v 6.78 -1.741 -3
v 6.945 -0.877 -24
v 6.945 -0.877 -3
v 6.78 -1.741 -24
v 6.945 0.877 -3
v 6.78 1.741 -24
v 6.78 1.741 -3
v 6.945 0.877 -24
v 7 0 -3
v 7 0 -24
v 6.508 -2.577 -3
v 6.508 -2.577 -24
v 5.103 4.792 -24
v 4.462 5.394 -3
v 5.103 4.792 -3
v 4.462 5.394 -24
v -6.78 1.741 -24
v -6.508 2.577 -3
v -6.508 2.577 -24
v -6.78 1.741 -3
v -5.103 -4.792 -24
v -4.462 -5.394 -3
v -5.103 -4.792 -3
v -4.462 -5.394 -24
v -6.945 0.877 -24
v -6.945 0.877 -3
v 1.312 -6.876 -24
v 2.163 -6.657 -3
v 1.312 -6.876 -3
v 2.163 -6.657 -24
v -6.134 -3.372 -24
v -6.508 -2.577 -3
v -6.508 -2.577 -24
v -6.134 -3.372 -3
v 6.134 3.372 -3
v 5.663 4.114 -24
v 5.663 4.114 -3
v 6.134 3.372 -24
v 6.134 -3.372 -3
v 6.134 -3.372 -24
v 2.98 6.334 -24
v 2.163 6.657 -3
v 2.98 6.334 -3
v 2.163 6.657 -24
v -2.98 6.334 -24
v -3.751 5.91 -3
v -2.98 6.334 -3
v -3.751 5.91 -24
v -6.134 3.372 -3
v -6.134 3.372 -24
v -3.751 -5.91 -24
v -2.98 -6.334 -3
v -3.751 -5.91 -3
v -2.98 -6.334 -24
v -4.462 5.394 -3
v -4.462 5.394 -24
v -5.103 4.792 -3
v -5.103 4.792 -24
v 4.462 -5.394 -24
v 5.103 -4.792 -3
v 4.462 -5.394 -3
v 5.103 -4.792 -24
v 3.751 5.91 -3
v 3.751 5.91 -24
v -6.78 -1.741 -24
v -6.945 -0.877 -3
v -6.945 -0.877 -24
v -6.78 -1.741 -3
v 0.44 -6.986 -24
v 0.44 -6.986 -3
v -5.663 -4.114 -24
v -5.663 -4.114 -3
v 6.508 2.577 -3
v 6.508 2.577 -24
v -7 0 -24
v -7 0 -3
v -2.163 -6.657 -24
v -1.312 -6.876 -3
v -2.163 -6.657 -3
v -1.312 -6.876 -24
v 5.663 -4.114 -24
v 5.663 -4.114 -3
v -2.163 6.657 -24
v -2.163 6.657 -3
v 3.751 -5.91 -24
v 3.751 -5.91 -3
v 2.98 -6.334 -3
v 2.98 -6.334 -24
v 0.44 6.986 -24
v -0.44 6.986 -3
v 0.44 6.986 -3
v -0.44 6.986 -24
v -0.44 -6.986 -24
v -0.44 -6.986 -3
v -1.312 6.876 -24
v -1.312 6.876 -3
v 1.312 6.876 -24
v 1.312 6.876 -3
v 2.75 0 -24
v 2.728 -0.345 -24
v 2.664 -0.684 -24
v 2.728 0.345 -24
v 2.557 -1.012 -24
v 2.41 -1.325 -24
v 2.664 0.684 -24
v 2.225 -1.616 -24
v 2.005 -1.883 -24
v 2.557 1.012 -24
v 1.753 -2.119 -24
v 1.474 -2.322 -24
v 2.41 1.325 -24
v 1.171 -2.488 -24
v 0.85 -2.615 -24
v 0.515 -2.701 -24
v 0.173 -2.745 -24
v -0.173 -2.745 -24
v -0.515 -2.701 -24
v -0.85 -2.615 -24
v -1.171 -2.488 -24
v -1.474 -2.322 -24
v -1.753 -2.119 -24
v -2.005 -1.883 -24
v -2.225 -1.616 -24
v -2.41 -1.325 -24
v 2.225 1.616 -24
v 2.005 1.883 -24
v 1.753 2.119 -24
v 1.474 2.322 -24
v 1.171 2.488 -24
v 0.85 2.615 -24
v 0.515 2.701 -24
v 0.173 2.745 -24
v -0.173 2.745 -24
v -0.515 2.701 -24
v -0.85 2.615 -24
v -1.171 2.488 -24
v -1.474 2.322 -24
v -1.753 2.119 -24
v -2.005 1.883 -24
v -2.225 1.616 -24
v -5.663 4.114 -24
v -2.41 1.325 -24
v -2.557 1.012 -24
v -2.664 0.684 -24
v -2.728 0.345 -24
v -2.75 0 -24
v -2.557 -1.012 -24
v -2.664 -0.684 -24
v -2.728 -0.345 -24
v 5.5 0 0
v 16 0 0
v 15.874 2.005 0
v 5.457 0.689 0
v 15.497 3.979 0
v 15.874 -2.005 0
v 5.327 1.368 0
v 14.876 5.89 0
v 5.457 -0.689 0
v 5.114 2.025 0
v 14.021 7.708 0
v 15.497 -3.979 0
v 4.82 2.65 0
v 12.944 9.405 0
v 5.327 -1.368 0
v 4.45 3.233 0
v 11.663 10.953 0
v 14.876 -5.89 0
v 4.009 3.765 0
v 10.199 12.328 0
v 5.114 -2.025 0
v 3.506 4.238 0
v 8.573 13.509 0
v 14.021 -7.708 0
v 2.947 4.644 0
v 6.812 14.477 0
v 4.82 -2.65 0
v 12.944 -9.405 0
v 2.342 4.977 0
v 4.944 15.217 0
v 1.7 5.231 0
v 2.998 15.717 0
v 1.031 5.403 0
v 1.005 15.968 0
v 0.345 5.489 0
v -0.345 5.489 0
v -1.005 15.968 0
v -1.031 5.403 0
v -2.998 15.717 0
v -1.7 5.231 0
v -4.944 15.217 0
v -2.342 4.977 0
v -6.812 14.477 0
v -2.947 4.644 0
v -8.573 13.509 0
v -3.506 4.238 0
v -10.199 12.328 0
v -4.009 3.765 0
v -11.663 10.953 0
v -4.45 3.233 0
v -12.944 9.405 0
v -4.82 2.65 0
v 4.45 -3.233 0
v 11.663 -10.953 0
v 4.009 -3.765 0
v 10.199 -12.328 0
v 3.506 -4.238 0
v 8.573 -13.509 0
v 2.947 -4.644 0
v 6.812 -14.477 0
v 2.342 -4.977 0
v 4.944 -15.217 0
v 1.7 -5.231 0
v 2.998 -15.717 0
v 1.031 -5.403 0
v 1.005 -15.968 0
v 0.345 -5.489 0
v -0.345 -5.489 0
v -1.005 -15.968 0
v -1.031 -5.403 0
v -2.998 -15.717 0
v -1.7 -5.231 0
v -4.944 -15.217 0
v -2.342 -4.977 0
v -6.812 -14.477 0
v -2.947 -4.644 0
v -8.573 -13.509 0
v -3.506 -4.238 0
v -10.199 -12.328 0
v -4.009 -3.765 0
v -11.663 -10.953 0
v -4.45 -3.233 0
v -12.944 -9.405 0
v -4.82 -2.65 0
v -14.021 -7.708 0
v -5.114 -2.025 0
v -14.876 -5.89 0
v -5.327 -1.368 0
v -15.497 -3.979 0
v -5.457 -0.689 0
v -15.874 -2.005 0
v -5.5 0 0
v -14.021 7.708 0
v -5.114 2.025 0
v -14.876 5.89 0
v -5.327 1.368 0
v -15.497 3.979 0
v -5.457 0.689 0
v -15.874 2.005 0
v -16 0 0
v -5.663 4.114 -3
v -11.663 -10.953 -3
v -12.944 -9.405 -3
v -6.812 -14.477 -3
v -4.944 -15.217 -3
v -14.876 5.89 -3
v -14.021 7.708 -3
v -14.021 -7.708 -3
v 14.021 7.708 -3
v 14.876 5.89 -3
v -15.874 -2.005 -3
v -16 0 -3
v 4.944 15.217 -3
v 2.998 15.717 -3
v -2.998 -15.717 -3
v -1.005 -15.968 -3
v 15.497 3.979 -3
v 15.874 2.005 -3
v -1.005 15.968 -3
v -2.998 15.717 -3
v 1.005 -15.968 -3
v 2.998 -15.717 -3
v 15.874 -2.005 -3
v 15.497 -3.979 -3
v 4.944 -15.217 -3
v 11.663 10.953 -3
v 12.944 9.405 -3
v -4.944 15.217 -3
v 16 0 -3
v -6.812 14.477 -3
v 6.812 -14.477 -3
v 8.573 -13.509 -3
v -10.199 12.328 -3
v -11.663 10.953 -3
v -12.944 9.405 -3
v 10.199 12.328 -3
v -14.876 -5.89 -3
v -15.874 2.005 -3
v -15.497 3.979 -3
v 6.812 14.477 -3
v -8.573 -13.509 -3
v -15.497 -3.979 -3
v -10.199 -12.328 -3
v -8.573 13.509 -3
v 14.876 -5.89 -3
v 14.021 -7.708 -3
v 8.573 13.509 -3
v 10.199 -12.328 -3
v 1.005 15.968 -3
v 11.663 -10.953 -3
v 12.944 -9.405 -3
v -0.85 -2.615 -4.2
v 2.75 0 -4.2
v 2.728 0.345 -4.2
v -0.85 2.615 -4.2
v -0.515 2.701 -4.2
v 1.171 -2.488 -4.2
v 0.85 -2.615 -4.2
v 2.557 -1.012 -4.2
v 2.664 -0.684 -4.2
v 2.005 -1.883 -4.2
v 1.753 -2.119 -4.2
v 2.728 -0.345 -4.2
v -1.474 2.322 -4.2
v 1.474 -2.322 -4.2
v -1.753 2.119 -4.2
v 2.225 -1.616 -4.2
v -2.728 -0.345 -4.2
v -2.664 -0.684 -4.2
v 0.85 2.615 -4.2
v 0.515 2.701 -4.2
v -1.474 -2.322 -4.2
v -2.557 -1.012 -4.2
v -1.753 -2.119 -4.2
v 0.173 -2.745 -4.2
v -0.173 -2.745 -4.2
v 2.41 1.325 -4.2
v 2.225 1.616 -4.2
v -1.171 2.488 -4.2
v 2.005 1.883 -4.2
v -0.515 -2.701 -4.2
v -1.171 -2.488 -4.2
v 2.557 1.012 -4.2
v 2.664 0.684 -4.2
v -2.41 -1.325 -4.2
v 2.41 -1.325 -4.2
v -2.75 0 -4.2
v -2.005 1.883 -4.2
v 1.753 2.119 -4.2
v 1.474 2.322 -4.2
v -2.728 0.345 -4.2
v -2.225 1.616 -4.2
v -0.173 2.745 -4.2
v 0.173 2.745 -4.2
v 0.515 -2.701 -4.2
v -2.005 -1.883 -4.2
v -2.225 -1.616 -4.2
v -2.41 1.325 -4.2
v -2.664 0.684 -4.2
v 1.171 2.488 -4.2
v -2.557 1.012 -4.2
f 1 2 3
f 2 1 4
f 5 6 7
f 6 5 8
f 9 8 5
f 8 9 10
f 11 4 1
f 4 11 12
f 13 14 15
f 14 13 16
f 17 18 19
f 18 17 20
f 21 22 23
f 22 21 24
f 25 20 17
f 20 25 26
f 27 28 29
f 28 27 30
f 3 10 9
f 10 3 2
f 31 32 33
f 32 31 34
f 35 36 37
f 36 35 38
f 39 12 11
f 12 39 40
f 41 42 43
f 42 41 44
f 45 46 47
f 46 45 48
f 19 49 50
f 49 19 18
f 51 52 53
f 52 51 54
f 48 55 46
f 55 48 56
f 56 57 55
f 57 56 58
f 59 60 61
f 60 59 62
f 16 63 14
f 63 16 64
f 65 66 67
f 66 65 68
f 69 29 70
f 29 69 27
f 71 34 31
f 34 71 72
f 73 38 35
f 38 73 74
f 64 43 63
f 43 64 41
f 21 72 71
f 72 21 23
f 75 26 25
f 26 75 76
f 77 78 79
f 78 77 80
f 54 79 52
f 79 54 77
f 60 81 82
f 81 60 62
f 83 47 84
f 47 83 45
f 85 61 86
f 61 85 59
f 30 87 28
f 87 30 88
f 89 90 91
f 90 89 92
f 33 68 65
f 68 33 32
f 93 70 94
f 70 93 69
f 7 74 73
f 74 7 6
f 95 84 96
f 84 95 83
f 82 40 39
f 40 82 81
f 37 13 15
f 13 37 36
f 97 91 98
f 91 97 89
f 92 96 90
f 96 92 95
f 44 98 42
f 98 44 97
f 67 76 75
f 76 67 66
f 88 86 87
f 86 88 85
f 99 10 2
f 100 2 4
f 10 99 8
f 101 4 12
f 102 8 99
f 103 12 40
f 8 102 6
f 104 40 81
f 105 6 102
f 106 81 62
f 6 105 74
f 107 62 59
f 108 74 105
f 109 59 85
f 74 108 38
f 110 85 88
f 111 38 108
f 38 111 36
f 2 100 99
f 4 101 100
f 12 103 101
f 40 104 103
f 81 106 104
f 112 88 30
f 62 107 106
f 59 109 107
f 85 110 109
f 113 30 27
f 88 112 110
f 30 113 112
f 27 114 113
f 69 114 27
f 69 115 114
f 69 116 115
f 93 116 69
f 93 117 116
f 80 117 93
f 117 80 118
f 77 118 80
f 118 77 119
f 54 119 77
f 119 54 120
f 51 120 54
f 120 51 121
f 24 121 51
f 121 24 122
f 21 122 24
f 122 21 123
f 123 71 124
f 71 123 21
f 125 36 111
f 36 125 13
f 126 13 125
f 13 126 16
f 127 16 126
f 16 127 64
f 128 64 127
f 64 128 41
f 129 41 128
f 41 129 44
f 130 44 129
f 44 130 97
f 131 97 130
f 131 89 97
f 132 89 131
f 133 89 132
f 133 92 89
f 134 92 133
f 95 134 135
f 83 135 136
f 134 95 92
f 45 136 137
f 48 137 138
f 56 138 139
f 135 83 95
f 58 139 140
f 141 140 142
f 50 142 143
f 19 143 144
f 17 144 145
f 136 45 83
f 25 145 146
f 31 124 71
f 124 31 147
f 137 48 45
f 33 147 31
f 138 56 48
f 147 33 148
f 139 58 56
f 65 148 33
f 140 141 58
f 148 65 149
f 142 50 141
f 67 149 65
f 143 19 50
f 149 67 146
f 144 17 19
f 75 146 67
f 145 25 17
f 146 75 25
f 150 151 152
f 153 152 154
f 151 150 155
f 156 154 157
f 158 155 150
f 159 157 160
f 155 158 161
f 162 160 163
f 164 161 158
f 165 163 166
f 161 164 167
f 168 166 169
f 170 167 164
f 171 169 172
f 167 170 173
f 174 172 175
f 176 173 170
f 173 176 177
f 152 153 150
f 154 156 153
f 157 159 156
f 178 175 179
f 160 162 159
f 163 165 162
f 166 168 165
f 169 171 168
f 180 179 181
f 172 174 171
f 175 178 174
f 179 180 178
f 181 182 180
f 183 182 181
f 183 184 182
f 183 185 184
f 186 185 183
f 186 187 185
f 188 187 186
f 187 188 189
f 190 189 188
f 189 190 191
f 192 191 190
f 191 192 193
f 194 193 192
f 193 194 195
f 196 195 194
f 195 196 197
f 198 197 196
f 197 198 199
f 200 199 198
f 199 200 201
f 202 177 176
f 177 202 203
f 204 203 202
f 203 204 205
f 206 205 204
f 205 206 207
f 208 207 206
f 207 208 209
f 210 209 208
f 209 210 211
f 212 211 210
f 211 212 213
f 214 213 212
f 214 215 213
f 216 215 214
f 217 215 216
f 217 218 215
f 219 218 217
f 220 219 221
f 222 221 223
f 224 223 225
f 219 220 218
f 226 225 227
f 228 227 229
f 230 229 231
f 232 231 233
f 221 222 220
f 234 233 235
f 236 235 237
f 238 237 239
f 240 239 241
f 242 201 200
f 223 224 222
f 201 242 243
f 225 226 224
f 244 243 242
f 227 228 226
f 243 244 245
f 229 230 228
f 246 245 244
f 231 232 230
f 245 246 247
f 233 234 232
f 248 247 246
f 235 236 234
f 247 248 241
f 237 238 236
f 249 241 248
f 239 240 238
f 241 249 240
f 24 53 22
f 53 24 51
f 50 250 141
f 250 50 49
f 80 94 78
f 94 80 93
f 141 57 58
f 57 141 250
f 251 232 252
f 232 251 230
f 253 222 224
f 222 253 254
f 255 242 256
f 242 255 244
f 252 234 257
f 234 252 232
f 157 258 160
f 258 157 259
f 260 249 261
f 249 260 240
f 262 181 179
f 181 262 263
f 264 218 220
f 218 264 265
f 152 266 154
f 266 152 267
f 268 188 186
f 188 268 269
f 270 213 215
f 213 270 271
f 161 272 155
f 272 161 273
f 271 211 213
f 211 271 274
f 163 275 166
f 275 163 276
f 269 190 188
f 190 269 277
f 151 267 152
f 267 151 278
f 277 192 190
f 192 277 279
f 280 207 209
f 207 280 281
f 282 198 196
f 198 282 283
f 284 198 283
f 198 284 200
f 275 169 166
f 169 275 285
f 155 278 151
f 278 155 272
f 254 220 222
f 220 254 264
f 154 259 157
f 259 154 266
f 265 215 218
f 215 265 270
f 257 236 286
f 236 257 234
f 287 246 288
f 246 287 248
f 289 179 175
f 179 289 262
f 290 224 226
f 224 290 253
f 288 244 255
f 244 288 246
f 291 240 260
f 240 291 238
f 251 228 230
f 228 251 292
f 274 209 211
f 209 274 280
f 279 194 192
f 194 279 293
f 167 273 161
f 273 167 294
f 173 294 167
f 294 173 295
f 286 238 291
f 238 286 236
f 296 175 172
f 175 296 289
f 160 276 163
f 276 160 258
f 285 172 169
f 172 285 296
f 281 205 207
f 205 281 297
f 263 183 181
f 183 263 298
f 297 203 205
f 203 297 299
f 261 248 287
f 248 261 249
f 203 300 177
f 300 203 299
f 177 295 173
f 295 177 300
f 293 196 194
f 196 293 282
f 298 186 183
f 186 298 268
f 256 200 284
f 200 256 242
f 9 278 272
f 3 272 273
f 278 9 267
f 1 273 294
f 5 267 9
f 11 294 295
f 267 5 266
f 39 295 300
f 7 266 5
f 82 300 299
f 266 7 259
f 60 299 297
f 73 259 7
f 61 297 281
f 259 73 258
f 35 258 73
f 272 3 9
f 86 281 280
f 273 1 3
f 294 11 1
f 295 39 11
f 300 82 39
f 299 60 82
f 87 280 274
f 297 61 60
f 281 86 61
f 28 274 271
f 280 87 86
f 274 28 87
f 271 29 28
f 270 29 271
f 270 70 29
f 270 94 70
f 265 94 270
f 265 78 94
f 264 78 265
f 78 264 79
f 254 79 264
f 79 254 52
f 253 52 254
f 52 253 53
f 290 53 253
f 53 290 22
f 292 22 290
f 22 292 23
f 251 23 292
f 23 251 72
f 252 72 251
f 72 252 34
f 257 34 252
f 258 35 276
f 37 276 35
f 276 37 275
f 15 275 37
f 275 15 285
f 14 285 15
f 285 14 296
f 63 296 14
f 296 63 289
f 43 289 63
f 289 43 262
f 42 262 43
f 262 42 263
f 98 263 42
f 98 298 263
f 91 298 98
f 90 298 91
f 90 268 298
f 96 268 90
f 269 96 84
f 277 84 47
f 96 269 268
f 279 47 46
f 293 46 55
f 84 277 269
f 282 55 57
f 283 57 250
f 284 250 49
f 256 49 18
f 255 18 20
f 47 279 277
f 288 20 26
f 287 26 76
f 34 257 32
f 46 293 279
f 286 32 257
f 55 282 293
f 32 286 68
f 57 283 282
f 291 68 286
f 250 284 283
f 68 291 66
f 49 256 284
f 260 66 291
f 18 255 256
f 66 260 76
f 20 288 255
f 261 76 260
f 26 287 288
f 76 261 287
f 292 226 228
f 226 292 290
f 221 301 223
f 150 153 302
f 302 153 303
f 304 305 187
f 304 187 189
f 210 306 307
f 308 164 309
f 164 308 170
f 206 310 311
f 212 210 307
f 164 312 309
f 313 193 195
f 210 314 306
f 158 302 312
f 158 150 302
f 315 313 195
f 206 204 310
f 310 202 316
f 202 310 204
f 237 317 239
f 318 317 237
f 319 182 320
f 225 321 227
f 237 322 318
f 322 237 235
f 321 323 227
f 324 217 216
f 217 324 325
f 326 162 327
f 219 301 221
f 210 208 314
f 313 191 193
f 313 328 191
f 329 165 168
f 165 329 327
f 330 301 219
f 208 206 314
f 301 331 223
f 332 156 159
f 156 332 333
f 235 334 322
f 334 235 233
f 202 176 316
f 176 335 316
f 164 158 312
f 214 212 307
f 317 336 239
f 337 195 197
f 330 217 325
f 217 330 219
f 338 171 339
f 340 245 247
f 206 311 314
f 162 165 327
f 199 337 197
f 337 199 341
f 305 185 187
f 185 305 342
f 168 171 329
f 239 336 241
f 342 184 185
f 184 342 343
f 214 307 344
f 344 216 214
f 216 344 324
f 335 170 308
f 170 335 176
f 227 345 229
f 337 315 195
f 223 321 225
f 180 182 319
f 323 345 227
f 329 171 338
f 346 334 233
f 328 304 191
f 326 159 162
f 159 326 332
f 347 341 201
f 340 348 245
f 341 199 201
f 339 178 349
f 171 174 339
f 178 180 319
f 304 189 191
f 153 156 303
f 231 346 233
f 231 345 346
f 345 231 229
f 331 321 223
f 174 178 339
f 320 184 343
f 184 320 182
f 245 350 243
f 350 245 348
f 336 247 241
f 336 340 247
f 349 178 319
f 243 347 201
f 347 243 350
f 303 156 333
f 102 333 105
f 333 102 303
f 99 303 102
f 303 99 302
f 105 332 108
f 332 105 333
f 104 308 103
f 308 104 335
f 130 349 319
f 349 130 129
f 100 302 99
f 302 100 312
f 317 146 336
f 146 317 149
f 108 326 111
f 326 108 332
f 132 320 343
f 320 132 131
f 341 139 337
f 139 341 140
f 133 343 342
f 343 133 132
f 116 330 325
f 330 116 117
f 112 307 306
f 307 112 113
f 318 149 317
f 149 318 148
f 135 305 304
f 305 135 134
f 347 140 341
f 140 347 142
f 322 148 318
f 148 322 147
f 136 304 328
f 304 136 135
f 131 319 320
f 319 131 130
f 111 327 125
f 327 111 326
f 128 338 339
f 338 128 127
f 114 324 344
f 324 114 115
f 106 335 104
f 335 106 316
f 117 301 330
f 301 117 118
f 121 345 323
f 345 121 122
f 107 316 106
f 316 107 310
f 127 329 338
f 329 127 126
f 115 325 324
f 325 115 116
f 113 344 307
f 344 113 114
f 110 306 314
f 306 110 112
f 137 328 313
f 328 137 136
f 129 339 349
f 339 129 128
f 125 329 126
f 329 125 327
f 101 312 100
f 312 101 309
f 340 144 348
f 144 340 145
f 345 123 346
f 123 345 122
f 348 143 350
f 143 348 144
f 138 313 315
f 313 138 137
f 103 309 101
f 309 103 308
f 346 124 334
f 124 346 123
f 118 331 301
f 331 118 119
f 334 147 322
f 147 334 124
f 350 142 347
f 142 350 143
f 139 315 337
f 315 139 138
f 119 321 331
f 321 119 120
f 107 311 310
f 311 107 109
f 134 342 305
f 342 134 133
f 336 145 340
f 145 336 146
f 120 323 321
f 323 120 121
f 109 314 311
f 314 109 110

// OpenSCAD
$fn = 50;


difference() {
	union() {
		translate(v = [0, 0, -24.0000000000]) {
			cylinder(h = 24, r = 7.0000000000);
		}
		translate(v = [0, 0, -3.0000000000]) {
			cylinder(h = 3, r = 16.0000000000);
		}
	}
	union() {
		translate(v = [0, 0, 0]) {
			rotate(a = [0, 0, 0]) {
				difference() {
					union() {
						#translate(v = [0, 0, -24.0000000000]) {
							cylinder(h = 24, r = 2.2500000000);
						}
						#translate(v = [0, 0, -4.2000000000]) {
							cylinder(h = 4.2000000000, r1 = 2.7500000000, r2 = 5.5000000000);
						}
						#translate(v = [0, 0, -24.0000000000]) {
							cylinder(h = 24, r = 2.7500000000);
						}
						#translate(v = [0, 0, -24.0000000000]) {
							cylinder(h = 24, r = 2.2500000000);
						}
					}
					union();
				}
			}
		}
	}
}
